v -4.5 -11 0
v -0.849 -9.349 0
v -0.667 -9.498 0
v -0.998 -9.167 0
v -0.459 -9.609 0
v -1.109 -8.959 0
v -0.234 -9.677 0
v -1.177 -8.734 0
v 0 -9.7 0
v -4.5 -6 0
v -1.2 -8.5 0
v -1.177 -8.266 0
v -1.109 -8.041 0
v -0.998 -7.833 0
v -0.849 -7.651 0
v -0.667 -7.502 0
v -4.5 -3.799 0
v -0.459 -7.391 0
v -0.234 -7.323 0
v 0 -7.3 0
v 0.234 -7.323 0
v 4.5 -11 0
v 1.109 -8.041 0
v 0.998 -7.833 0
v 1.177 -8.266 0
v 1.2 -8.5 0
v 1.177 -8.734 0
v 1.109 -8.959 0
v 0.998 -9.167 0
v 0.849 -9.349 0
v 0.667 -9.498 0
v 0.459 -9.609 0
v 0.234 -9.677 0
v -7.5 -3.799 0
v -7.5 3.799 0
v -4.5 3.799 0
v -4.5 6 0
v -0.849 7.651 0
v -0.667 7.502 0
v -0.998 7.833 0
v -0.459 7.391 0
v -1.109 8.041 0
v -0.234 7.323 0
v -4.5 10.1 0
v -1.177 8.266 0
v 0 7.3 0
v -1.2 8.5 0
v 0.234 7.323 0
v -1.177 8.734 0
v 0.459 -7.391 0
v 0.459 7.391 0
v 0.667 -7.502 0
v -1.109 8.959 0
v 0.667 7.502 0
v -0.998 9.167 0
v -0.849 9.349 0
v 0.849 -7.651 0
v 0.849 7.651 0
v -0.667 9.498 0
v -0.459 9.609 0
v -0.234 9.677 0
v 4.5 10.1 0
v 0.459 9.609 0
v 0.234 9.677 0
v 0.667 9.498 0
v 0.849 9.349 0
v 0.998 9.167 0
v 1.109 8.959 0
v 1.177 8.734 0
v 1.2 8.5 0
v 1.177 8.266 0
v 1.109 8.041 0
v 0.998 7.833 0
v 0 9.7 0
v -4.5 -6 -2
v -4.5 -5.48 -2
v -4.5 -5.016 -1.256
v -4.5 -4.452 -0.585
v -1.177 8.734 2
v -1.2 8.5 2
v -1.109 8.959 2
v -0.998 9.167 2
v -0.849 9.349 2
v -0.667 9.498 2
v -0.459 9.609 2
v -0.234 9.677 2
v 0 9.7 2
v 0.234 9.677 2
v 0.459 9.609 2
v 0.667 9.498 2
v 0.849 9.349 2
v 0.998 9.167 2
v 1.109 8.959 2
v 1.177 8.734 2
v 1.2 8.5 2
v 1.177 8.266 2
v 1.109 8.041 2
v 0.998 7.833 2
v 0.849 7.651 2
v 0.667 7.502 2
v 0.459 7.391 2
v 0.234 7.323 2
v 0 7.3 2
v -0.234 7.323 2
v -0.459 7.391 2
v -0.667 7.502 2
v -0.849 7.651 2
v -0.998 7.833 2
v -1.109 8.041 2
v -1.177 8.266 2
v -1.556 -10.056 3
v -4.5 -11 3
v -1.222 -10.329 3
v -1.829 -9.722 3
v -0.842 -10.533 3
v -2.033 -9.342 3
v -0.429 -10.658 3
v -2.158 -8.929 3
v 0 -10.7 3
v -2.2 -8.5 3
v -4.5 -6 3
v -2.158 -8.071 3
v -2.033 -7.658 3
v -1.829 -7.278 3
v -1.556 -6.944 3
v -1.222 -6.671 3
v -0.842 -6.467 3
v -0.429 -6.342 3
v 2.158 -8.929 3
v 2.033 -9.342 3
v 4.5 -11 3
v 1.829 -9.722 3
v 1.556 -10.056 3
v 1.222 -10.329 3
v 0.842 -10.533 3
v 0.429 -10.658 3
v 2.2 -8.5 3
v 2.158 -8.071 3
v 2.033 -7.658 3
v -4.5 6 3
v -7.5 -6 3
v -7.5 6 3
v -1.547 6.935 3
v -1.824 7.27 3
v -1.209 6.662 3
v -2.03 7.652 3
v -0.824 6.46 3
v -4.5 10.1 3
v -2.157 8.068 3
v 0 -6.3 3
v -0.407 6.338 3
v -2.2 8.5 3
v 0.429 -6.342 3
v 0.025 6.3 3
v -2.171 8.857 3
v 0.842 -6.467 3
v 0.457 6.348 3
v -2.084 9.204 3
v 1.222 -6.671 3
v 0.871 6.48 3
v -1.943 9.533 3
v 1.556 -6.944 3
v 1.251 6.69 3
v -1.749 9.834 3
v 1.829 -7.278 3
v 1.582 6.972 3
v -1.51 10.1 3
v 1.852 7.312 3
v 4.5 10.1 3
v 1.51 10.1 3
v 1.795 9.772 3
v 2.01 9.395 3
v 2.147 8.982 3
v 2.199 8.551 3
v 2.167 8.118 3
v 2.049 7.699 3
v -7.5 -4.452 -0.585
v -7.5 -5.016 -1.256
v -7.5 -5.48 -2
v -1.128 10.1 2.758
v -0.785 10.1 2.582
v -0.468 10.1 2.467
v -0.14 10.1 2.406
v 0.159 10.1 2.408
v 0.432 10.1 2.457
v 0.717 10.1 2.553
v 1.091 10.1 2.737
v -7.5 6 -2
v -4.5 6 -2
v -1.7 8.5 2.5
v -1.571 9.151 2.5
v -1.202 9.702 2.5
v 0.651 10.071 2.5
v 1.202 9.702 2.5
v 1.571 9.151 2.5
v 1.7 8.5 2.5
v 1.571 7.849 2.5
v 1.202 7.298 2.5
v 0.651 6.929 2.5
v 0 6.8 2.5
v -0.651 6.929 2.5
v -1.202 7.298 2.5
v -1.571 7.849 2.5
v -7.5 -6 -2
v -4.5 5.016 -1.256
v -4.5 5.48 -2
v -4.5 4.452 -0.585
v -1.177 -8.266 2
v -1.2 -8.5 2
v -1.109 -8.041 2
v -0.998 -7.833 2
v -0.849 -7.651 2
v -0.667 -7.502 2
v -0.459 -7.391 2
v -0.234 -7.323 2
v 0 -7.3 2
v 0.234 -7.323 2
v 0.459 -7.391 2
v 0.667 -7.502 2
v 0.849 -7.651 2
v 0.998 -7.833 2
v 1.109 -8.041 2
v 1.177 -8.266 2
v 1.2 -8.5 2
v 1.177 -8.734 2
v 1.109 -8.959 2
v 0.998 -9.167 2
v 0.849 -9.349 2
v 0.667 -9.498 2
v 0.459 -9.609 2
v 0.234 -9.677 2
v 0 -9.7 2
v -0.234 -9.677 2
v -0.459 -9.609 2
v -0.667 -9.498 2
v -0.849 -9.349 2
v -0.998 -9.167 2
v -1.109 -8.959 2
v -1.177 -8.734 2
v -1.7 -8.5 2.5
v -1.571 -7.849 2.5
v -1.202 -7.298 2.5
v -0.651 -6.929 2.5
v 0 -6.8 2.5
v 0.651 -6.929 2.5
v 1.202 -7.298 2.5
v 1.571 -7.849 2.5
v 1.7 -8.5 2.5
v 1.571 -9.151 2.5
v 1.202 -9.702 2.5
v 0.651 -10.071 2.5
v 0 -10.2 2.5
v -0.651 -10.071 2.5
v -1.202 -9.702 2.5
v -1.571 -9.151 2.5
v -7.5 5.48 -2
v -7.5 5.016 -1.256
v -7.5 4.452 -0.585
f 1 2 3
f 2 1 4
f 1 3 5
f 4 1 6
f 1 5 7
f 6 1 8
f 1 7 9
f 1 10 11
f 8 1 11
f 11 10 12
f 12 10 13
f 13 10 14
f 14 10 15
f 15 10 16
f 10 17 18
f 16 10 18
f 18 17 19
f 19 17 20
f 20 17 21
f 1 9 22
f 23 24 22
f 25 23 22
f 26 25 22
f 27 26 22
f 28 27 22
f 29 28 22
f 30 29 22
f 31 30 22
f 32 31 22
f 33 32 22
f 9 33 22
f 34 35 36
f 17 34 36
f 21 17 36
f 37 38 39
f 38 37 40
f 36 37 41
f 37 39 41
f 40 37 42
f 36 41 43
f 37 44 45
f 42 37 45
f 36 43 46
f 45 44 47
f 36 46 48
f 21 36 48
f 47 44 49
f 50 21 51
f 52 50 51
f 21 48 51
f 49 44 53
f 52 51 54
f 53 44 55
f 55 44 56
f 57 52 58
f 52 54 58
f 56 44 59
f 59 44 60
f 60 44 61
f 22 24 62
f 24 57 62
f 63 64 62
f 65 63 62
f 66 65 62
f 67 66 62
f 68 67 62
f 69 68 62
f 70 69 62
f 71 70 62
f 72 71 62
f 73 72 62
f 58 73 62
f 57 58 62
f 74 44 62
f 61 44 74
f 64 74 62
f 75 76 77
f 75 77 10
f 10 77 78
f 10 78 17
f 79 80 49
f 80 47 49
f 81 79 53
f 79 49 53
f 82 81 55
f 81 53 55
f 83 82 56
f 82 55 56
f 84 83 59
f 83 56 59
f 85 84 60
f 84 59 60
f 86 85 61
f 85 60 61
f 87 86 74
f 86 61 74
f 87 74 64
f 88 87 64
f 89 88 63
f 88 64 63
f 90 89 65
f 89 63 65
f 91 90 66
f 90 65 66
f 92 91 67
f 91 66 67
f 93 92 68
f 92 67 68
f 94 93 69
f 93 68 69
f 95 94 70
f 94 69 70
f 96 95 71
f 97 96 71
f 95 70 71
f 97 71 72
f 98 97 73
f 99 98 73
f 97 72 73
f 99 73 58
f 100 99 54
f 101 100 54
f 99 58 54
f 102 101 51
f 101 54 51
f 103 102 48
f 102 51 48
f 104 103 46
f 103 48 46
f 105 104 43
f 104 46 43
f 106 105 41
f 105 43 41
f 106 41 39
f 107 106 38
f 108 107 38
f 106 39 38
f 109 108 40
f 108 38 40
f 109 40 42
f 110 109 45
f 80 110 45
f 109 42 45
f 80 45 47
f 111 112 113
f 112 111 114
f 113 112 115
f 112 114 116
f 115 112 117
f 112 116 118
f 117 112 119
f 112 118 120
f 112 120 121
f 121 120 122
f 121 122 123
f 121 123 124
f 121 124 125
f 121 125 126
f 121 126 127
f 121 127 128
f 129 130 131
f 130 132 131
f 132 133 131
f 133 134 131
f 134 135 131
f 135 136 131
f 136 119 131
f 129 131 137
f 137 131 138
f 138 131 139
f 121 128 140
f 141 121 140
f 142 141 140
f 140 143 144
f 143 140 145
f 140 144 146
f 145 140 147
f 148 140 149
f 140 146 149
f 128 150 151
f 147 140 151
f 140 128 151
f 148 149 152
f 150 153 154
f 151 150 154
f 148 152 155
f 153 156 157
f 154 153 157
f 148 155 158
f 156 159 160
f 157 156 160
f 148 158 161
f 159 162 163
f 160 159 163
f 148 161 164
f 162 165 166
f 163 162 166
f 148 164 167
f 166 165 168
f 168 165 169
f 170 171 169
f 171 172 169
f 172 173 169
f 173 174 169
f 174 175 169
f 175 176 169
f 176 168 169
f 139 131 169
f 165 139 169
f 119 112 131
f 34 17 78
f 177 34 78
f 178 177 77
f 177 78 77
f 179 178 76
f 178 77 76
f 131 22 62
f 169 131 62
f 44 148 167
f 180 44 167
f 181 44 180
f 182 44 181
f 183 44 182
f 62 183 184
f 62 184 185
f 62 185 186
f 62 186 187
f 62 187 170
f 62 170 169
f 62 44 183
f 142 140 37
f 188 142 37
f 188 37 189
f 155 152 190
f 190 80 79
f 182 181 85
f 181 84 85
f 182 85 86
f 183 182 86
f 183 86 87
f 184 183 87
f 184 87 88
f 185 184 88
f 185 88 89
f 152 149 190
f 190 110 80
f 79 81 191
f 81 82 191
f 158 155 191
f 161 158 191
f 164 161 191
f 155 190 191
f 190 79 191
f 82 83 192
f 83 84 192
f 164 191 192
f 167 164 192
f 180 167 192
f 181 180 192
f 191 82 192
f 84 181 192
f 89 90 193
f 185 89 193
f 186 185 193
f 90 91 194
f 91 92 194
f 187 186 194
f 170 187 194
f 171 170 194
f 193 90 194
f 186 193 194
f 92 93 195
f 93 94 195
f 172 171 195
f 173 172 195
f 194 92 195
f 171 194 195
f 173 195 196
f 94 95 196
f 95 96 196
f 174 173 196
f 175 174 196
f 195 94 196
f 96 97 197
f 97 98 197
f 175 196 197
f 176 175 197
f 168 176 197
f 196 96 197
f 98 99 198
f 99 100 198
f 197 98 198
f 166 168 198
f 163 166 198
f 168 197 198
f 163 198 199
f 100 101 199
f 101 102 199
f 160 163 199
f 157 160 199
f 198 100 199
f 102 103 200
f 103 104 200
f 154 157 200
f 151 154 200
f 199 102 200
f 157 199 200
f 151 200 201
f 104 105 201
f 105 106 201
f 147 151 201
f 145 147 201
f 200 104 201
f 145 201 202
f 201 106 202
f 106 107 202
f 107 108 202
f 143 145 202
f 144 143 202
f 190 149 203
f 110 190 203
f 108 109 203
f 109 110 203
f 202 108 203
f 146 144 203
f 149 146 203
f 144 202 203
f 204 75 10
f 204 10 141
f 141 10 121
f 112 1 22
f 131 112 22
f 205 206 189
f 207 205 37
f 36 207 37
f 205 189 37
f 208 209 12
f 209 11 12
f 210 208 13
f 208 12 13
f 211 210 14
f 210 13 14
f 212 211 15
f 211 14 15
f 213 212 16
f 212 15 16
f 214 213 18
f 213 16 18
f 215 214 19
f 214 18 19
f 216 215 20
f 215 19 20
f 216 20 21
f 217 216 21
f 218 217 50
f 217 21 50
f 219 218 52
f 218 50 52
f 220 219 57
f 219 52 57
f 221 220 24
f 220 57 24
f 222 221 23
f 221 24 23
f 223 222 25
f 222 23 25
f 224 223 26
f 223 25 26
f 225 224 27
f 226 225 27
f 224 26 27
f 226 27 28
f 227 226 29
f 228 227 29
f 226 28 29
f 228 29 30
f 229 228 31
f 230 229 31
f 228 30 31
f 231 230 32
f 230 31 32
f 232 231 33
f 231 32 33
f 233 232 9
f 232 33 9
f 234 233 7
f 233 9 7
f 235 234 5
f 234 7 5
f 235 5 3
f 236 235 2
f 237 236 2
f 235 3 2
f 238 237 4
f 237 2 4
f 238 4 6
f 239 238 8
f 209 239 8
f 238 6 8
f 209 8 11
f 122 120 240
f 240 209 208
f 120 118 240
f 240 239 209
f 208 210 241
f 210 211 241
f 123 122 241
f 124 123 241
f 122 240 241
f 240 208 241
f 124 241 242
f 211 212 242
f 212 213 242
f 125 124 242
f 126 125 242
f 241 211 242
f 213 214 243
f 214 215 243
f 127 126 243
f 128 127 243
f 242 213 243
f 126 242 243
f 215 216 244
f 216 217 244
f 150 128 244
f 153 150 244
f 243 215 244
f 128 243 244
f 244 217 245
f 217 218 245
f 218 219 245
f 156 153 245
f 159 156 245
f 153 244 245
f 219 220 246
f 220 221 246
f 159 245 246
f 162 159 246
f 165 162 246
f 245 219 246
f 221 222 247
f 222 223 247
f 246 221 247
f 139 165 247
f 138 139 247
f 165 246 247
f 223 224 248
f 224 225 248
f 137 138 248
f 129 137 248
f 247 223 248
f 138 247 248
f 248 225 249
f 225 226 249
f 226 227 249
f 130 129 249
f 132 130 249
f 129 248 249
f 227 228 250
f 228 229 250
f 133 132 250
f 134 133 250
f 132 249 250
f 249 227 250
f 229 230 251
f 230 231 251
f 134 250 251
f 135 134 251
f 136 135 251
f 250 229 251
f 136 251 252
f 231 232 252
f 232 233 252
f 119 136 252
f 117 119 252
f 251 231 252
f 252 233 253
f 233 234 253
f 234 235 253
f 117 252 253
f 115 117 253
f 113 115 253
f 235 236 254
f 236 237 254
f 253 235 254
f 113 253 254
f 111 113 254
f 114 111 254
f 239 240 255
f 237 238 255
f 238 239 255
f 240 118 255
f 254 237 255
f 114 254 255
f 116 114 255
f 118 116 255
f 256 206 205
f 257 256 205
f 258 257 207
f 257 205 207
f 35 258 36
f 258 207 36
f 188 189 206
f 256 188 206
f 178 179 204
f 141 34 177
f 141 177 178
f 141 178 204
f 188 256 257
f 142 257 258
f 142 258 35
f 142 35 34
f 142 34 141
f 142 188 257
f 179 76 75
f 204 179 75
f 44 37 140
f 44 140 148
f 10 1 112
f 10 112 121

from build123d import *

# Parameters (mm, degrees)
SKETCH1_W                                       = 9
SKETCH1_H                                       = 22
BOSS_EXTRUDE1_DEPTH                             = 3
CSK_FOR_M2_FLAT_HEAD_MACHINE_SCREW1_D           = 2.4
CSK_FOR_M2_FLAT_HEAD_MACHINE_SCREW1_DEPTH       = 10
CSK_FOR_M2_FLAT_HEAD_MACHINE_SCREW1_CSINK_D     = 4.4
CSK_FOR_M2_FLAT_HEAD_MACHINE_SCREW1_CSINK_ANGLE = 90
CSK_FOR_M2_FLAT_HEAD_MACHINE_SCREW1_TIP         = 0.721032743
BOSS_EXTRUDE2_DEPTH                             = 3
SKETCH5_W                                       = 9
SKETCH5_H                                       = 3
CUT_EXTRUDE1_DEPTH                              = 0.9


with BuildPart() as part:
    # Sketch1 → Boss-Extrude1 (new body)
    with BuildSketch(Plane.XY):
        Rectangle(SKETCH1_W, SKETCH1_H)
    extrude(amount=BOSS_EXTRUDE1_DEPTH)

    # CSK for M2 Flat Head Machine Screw1
    with Locations(Plane.XY.offset(3)):
        with Locations((0, 8.5), (0, -8.5)):
            CounterSinkHole(CSK_FOR_M2_FLAT_HEAD_MACHINE_SCREW1_D / 2, CSK_FOR_M2_FLAT_HEAD_MACHINE_SCREW1_CSINK_D / 2, depth=CSK_FOR_M2_FLAT_HEAD_MACHINE_SCREW1_DEPTH, counter_sink_angle=CSK_FOR_M2_FLAT_HEAD_MACHINE_SCREW1_CSINK_ANGLE)
            with Locations((0, 0, -(CSK_FOR_M2_FLAT_HEAD_MACHINE_SCREW1_DEPTH + CSK_FOR_M2_FLAT_HEAD_MACHINE_SCREW1_TIP / 2))):  # 118° drill point
                Cone(0, CSK_FOR_M2_FLAT_HEAD_MACHINE_SCREW1_D / 2, CSK_FOR_M2_FLAT_HEAD_MACHINE_SCREW1_TIP, mode=Mode.SUBTRACT)

    # Sketch4 → Boss-Extrude2 (add)
    with BuildSketch(Plane.ZY.offset(4.5)):
        with BuildLine():
            Line((3, 6), (-2, 6))
            Line((-2, 6), (-2, 5.479963504))
            ThreePointArc((-2, 5.479963504), (-0.910429195, 4.745874502), (0, 3.798683983))
            Line((0, 3.798683983), (0, -3.798683983))
            ThreePointArc((0, -3.798683983), (-0.910429195, -4.745874502), (-2, -5.479963504))
            Line((-2, -5.479963504), (-2, -6))
            Line((-2, -6), (3, -6))
            Line((3, -6), (3, 6))
        make_face()
    extrude(amount=BOSS_EXTRUDE2_DEPTH)

    # Sketch5 → Cut-Extrude1 (cut)
    with BuildSketch(Plane(origin=(0, 11, 0), x_dir=(1, 0, 0), z_dir=(0, 1, 0))):
        with Locations((0, -1.5)):
            Rectangle(SKETCH5_W, SKETCH5_H)
    extrude(amount=-CUT_EXTRUDE1_DEPTH, mode=Mode.SUBTRACT)


solid = part.part
